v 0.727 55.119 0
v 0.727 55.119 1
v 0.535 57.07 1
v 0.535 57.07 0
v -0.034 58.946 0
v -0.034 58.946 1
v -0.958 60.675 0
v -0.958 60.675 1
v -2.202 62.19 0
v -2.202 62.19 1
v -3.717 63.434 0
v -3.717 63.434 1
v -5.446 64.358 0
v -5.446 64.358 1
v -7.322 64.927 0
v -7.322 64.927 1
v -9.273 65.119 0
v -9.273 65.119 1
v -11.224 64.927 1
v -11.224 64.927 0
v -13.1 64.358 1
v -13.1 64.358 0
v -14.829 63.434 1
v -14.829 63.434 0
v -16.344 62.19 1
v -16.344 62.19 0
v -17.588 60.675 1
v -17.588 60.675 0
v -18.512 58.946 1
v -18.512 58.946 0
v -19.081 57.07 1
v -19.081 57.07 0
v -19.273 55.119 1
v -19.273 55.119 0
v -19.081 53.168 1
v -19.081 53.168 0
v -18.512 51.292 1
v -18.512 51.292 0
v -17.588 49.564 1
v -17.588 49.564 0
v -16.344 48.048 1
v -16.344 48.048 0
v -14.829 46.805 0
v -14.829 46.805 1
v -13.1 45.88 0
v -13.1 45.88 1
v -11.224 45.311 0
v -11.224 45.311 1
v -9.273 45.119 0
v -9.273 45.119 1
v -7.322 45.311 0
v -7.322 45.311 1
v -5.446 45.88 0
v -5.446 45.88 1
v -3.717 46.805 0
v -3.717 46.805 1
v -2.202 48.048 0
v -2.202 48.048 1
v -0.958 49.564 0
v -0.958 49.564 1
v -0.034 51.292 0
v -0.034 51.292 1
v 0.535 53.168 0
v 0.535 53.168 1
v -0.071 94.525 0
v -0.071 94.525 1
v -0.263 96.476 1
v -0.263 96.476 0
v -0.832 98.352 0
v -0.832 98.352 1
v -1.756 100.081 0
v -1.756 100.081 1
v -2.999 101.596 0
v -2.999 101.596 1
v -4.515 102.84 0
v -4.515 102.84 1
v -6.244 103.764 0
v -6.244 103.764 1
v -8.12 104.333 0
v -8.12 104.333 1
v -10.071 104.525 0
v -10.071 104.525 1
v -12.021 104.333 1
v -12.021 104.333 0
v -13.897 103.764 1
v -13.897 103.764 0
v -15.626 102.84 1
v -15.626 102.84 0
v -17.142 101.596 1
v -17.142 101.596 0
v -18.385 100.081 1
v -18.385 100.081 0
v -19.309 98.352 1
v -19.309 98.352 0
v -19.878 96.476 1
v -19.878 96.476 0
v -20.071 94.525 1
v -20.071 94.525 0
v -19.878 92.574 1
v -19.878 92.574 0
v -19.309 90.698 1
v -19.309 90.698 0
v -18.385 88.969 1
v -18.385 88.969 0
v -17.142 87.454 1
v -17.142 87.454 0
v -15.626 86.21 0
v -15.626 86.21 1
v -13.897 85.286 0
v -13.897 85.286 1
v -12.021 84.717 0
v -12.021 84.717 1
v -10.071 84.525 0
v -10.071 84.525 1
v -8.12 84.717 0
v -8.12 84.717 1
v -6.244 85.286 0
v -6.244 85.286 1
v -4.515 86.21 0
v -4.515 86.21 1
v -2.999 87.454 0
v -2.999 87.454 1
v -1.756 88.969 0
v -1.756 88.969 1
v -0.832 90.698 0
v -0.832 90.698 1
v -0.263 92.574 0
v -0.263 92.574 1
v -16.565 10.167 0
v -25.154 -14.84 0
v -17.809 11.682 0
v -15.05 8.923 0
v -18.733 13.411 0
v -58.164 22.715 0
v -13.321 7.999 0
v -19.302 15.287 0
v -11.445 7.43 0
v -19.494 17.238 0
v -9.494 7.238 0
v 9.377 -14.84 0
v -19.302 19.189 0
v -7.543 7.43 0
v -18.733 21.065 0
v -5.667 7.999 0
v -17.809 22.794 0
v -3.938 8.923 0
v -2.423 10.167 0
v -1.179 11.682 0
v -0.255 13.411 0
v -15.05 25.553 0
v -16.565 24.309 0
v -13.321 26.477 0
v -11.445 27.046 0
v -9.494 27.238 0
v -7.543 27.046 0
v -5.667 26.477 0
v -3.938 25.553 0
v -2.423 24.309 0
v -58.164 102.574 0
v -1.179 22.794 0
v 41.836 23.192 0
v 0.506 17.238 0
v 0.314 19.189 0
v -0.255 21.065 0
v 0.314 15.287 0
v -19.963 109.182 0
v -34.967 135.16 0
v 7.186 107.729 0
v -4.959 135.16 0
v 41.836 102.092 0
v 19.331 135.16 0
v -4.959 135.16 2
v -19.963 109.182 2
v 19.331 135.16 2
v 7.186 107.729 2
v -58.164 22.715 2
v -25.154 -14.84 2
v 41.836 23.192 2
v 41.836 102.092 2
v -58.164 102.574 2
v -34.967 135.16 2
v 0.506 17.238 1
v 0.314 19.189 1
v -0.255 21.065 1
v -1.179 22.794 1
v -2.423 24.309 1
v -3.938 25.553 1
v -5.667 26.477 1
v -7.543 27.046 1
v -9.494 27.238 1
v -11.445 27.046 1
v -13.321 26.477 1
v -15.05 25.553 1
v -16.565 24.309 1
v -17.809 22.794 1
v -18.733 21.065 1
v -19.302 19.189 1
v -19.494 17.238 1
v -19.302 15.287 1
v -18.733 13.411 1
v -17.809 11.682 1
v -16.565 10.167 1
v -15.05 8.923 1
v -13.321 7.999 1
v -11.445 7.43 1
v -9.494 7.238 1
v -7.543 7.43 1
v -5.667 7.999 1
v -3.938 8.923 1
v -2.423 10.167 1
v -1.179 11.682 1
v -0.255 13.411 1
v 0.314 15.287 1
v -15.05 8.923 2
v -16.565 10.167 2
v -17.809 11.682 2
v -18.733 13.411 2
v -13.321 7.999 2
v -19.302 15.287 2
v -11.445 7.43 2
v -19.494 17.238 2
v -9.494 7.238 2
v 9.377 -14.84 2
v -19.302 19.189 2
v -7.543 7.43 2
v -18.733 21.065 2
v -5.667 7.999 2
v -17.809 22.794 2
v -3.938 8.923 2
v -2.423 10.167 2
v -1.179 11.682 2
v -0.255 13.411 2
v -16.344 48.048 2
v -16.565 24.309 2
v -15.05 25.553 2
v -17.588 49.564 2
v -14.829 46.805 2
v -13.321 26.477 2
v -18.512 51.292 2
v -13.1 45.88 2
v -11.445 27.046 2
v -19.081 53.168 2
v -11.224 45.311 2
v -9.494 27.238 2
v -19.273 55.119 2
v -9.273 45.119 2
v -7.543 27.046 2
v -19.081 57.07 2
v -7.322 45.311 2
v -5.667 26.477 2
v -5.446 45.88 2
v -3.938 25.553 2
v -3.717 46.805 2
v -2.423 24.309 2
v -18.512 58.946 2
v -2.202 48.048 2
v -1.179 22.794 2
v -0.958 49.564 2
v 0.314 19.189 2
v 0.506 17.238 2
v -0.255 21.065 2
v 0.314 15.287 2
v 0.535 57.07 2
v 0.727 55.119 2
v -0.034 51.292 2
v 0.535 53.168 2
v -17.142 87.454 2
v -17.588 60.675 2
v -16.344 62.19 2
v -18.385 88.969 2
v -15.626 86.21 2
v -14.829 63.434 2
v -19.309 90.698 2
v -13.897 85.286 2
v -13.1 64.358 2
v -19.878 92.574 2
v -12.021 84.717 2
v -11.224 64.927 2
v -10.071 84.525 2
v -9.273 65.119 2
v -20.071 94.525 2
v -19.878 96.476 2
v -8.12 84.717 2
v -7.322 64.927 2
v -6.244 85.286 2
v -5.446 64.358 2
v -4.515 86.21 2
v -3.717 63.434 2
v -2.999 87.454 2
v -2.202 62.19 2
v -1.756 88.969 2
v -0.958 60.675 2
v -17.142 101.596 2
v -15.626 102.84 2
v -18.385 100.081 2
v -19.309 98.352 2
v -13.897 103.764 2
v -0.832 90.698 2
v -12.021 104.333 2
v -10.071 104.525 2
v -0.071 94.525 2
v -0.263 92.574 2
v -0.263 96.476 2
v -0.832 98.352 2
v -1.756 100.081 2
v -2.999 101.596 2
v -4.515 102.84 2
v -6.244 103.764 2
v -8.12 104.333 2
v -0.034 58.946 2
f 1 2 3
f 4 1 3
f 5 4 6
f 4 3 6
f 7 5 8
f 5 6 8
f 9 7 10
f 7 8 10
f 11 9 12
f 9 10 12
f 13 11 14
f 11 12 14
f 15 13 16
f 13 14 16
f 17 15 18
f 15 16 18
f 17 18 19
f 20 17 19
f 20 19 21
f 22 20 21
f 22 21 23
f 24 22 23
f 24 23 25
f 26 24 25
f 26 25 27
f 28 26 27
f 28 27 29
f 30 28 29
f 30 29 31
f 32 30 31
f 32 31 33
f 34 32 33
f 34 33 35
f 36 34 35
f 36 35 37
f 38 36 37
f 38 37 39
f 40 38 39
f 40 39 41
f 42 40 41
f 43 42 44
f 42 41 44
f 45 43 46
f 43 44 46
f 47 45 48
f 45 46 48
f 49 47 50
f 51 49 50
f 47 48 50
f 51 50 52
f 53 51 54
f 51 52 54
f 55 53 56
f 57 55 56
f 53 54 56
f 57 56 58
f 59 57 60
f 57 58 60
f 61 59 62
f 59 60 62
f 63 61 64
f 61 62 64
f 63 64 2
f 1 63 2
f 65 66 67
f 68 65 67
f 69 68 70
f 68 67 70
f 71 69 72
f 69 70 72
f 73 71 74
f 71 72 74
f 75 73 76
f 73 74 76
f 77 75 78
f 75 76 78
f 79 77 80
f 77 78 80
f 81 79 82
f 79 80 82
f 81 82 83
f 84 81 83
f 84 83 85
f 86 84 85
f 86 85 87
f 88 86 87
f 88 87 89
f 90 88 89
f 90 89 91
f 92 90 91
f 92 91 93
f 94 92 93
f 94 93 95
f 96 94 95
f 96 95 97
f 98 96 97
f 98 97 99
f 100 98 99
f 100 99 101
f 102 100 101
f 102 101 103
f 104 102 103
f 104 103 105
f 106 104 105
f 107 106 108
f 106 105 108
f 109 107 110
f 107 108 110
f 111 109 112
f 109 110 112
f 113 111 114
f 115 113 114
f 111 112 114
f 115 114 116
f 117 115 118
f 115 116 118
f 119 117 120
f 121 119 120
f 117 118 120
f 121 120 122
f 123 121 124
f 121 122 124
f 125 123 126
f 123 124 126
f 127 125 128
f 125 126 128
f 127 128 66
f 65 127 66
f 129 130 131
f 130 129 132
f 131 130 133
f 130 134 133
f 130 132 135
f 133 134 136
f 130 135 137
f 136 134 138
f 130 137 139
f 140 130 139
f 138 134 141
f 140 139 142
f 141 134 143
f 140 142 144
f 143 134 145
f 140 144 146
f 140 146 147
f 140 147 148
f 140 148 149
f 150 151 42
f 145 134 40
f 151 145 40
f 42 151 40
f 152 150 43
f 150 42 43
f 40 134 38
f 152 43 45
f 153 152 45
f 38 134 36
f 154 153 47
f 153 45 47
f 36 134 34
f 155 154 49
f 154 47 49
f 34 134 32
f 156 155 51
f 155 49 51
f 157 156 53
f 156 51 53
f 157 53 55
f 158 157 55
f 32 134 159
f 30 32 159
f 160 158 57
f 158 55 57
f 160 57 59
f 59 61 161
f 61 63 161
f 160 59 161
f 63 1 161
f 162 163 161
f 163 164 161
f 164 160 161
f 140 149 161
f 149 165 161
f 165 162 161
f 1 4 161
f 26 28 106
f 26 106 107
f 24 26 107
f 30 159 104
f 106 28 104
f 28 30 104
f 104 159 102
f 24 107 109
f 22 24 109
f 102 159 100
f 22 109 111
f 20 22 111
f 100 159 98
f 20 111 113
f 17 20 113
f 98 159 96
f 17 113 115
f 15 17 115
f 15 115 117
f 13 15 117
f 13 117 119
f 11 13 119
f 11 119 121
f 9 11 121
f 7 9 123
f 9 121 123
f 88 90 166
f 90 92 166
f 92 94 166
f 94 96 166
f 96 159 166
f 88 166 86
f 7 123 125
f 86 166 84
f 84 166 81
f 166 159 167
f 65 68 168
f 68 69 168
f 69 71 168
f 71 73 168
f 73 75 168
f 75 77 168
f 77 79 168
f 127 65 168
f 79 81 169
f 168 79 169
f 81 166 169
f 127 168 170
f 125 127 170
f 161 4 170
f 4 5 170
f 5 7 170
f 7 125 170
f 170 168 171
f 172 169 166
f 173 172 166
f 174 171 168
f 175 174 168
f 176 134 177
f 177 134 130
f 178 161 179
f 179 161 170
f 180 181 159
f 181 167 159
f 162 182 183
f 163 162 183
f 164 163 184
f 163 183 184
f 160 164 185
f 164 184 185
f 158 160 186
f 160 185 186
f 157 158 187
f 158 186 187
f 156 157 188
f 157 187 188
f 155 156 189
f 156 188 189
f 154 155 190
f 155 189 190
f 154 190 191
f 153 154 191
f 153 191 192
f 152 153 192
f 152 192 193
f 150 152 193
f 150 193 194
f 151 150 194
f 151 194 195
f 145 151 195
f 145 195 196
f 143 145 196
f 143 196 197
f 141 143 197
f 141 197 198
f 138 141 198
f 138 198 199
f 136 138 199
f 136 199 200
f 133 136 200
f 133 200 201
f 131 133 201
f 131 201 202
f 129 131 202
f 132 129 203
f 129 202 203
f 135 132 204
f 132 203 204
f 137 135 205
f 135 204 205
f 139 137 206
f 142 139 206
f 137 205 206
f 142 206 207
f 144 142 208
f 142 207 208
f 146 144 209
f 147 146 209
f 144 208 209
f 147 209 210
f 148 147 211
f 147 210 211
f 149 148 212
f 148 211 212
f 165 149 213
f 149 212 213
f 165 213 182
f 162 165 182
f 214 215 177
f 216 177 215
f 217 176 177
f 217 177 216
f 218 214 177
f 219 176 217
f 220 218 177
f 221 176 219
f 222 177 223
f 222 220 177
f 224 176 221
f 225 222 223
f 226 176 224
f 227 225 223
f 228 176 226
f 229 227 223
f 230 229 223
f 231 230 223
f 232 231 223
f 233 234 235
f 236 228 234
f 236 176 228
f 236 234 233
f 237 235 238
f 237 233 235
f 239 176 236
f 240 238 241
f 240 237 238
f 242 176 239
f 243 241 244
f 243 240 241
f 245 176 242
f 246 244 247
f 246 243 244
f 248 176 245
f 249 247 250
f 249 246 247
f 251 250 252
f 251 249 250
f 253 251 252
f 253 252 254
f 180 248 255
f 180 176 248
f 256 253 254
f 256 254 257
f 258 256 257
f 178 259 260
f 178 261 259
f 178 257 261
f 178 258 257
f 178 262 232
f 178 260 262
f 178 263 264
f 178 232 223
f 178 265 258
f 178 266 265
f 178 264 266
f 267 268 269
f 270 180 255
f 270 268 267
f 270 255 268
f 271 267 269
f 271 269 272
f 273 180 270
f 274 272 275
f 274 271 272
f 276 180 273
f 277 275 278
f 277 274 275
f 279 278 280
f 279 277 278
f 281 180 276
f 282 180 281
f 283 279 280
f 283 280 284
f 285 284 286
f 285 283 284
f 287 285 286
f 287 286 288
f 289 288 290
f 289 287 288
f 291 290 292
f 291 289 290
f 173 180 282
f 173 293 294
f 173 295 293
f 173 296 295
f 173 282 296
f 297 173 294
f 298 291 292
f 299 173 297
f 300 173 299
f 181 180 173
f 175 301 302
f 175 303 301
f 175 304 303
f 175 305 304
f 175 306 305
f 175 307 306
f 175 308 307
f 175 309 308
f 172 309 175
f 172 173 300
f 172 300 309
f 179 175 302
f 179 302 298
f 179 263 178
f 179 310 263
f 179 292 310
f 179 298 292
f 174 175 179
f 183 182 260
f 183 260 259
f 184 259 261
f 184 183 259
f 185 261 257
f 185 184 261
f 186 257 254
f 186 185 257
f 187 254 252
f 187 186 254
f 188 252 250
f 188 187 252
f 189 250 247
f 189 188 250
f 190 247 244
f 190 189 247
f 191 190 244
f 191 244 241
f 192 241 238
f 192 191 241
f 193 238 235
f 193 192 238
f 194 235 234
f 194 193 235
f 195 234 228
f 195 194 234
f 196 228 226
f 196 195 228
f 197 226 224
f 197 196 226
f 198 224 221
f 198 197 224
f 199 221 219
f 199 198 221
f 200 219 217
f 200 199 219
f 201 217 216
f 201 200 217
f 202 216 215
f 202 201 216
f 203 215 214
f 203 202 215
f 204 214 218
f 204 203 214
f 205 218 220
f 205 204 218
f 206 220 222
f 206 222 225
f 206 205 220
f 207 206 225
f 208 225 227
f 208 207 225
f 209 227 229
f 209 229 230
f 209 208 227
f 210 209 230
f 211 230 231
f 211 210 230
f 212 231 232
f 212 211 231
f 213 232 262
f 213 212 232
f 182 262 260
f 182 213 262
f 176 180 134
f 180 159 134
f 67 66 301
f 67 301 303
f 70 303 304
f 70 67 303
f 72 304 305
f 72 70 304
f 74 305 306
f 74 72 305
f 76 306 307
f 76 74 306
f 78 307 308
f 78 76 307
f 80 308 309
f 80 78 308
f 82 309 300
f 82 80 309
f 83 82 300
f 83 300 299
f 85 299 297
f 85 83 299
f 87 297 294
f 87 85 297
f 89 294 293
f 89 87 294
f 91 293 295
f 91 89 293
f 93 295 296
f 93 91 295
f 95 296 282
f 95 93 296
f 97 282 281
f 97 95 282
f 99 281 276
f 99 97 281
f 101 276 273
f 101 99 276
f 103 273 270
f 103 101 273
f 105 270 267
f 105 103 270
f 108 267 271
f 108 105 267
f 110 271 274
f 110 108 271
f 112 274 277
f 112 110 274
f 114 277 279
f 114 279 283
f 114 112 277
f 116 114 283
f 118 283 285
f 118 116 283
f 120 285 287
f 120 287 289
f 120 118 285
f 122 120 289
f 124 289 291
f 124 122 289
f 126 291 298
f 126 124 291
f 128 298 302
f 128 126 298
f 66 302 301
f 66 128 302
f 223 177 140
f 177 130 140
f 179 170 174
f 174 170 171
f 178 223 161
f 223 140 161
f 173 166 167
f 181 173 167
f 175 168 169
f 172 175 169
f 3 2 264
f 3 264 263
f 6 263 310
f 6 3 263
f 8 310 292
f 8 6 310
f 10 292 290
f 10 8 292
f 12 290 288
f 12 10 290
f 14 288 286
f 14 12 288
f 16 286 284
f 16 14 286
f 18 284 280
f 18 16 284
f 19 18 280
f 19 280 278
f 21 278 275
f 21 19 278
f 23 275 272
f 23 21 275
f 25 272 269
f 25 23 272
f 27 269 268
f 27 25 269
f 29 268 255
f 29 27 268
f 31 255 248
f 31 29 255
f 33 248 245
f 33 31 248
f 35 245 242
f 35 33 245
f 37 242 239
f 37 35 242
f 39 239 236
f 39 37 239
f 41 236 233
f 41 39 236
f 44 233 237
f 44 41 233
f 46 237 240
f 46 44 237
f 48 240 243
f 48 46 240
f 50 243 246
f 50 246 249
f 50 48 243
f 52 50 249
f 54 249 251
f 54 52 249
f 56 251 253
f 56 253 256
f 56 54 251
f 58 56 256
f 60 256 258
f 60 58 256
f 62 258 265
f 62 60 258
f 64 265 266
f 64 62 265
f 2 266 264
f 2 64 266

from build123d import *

# Parameters (mm, degrees)
F0_W     = 100
F0_H     = 150
F1_DEPTH = 1
F2_R     = 10
F3_DEPTH = 25
F5_DEPTH = 25
F8_DEPTH = 25
F7_R     = 10
F9_DEPTH = 1


with BuildPart() as f1:
    # F0 (on Top) → F1 (new body)
    with BuildSketch(Plane.XY):
        with Locations((-8.1639520824, 60.1602055132)):
            Rectangle(F0_W, F0_H)
    extrude(amount=F1_DEPTH)

    # F2 (on face) → F3 (cut)
    with BuildSketch(Plane.XY.offset(1)):
        with Locations((-10.0705353543, 94.5251360536)):
            Circle(F2_R)
        with Locations((-9.4941006973, 17.237842083)):
            Circle(F2_R)
        with Locations((-9.2731751502, 55.1192685962)):
            Circle(F2_R)
    extrude(amount=-F3_DEPTH, mode=Mode.SUBTRACT)

    # F4 (on face) → F5 (cut)
    with BuildSketch(Plane.XY.offset(1)):
        Polygon((41.8360479176, 23.1922029477), (9.3773484498, -14.8397944868), (41.8360479176, -14.8397944868), align=None)
        Polygon((-25.1544182483, -14.8397944868), (-58.1639520824, 22.7151076707), (-58.1639520824, -14.8397944868), align=None)
    extrude(amount=-F5_DEPTH, mode=Mode.SUBTRACT)

    # F6 (on face) → F8 (cut)
    with BuildSketch(Plane.XY.offset(1)):
        Polygon((-4.9593081612, 135.1602055132), (-34.9667105038, 135.1602055132), (-19.9630093325, 109.1815806235), align=None)
        Polygon((19.3310942209, 135.1602055132), (-4.9593081612, 135.1602055132), (7.1858930298, 107.7285798226), align=None)
        Polygon((41.8360479176, 135.1602055132), (19.3310942209, 135.1602055132), (41.8360479176, 102.0916848462), align=None)
        Polygon((-58.1639520824, 135.1602055132), (-58.1639520824, 102.5735827495), (-34.9667105038, 135.1602055132), align=None)
    extrude(amount=-F8_DEPTH, mode=Mode.SUBTRACT)

    # F7 (on face) → F9 (join)
    with BuildSketch(Plane.XY.offset(1)):
        Polygon((-19.9630093325, 109.1815806235), (-34.9667105038, 135.1602055132), (-58.1639520824, 102.5735827495), (-58.1639520824, 22.7151076707), (-25.1544182483, -14.8397944868), (9.3773484498, -14.8397944868), (41.8360479176, 23.1922029477), (41.8360479176, 102.0916848462), (19.3310942209, 135.1602055132), (7.1858930298, 107.7285798226), (-4.9593081612, 135.1602055132), align=None)
        with Locations((-9.4941006973, 17.237842083)):
            Circle(F7_R, mode=Mode.SUBTRACT)
        with Locations((-9.2731751502, 55.1192685962)):
            Circle(F7_R, mode=Mode.SUBTRACT)
        with Locations((-10.0705353543, 94.5251360536)):
            Circle(F7_R, mode=Mode.SUBTRACT)
    extrude(amount=F9_DEPTH)


solid = f1.part
